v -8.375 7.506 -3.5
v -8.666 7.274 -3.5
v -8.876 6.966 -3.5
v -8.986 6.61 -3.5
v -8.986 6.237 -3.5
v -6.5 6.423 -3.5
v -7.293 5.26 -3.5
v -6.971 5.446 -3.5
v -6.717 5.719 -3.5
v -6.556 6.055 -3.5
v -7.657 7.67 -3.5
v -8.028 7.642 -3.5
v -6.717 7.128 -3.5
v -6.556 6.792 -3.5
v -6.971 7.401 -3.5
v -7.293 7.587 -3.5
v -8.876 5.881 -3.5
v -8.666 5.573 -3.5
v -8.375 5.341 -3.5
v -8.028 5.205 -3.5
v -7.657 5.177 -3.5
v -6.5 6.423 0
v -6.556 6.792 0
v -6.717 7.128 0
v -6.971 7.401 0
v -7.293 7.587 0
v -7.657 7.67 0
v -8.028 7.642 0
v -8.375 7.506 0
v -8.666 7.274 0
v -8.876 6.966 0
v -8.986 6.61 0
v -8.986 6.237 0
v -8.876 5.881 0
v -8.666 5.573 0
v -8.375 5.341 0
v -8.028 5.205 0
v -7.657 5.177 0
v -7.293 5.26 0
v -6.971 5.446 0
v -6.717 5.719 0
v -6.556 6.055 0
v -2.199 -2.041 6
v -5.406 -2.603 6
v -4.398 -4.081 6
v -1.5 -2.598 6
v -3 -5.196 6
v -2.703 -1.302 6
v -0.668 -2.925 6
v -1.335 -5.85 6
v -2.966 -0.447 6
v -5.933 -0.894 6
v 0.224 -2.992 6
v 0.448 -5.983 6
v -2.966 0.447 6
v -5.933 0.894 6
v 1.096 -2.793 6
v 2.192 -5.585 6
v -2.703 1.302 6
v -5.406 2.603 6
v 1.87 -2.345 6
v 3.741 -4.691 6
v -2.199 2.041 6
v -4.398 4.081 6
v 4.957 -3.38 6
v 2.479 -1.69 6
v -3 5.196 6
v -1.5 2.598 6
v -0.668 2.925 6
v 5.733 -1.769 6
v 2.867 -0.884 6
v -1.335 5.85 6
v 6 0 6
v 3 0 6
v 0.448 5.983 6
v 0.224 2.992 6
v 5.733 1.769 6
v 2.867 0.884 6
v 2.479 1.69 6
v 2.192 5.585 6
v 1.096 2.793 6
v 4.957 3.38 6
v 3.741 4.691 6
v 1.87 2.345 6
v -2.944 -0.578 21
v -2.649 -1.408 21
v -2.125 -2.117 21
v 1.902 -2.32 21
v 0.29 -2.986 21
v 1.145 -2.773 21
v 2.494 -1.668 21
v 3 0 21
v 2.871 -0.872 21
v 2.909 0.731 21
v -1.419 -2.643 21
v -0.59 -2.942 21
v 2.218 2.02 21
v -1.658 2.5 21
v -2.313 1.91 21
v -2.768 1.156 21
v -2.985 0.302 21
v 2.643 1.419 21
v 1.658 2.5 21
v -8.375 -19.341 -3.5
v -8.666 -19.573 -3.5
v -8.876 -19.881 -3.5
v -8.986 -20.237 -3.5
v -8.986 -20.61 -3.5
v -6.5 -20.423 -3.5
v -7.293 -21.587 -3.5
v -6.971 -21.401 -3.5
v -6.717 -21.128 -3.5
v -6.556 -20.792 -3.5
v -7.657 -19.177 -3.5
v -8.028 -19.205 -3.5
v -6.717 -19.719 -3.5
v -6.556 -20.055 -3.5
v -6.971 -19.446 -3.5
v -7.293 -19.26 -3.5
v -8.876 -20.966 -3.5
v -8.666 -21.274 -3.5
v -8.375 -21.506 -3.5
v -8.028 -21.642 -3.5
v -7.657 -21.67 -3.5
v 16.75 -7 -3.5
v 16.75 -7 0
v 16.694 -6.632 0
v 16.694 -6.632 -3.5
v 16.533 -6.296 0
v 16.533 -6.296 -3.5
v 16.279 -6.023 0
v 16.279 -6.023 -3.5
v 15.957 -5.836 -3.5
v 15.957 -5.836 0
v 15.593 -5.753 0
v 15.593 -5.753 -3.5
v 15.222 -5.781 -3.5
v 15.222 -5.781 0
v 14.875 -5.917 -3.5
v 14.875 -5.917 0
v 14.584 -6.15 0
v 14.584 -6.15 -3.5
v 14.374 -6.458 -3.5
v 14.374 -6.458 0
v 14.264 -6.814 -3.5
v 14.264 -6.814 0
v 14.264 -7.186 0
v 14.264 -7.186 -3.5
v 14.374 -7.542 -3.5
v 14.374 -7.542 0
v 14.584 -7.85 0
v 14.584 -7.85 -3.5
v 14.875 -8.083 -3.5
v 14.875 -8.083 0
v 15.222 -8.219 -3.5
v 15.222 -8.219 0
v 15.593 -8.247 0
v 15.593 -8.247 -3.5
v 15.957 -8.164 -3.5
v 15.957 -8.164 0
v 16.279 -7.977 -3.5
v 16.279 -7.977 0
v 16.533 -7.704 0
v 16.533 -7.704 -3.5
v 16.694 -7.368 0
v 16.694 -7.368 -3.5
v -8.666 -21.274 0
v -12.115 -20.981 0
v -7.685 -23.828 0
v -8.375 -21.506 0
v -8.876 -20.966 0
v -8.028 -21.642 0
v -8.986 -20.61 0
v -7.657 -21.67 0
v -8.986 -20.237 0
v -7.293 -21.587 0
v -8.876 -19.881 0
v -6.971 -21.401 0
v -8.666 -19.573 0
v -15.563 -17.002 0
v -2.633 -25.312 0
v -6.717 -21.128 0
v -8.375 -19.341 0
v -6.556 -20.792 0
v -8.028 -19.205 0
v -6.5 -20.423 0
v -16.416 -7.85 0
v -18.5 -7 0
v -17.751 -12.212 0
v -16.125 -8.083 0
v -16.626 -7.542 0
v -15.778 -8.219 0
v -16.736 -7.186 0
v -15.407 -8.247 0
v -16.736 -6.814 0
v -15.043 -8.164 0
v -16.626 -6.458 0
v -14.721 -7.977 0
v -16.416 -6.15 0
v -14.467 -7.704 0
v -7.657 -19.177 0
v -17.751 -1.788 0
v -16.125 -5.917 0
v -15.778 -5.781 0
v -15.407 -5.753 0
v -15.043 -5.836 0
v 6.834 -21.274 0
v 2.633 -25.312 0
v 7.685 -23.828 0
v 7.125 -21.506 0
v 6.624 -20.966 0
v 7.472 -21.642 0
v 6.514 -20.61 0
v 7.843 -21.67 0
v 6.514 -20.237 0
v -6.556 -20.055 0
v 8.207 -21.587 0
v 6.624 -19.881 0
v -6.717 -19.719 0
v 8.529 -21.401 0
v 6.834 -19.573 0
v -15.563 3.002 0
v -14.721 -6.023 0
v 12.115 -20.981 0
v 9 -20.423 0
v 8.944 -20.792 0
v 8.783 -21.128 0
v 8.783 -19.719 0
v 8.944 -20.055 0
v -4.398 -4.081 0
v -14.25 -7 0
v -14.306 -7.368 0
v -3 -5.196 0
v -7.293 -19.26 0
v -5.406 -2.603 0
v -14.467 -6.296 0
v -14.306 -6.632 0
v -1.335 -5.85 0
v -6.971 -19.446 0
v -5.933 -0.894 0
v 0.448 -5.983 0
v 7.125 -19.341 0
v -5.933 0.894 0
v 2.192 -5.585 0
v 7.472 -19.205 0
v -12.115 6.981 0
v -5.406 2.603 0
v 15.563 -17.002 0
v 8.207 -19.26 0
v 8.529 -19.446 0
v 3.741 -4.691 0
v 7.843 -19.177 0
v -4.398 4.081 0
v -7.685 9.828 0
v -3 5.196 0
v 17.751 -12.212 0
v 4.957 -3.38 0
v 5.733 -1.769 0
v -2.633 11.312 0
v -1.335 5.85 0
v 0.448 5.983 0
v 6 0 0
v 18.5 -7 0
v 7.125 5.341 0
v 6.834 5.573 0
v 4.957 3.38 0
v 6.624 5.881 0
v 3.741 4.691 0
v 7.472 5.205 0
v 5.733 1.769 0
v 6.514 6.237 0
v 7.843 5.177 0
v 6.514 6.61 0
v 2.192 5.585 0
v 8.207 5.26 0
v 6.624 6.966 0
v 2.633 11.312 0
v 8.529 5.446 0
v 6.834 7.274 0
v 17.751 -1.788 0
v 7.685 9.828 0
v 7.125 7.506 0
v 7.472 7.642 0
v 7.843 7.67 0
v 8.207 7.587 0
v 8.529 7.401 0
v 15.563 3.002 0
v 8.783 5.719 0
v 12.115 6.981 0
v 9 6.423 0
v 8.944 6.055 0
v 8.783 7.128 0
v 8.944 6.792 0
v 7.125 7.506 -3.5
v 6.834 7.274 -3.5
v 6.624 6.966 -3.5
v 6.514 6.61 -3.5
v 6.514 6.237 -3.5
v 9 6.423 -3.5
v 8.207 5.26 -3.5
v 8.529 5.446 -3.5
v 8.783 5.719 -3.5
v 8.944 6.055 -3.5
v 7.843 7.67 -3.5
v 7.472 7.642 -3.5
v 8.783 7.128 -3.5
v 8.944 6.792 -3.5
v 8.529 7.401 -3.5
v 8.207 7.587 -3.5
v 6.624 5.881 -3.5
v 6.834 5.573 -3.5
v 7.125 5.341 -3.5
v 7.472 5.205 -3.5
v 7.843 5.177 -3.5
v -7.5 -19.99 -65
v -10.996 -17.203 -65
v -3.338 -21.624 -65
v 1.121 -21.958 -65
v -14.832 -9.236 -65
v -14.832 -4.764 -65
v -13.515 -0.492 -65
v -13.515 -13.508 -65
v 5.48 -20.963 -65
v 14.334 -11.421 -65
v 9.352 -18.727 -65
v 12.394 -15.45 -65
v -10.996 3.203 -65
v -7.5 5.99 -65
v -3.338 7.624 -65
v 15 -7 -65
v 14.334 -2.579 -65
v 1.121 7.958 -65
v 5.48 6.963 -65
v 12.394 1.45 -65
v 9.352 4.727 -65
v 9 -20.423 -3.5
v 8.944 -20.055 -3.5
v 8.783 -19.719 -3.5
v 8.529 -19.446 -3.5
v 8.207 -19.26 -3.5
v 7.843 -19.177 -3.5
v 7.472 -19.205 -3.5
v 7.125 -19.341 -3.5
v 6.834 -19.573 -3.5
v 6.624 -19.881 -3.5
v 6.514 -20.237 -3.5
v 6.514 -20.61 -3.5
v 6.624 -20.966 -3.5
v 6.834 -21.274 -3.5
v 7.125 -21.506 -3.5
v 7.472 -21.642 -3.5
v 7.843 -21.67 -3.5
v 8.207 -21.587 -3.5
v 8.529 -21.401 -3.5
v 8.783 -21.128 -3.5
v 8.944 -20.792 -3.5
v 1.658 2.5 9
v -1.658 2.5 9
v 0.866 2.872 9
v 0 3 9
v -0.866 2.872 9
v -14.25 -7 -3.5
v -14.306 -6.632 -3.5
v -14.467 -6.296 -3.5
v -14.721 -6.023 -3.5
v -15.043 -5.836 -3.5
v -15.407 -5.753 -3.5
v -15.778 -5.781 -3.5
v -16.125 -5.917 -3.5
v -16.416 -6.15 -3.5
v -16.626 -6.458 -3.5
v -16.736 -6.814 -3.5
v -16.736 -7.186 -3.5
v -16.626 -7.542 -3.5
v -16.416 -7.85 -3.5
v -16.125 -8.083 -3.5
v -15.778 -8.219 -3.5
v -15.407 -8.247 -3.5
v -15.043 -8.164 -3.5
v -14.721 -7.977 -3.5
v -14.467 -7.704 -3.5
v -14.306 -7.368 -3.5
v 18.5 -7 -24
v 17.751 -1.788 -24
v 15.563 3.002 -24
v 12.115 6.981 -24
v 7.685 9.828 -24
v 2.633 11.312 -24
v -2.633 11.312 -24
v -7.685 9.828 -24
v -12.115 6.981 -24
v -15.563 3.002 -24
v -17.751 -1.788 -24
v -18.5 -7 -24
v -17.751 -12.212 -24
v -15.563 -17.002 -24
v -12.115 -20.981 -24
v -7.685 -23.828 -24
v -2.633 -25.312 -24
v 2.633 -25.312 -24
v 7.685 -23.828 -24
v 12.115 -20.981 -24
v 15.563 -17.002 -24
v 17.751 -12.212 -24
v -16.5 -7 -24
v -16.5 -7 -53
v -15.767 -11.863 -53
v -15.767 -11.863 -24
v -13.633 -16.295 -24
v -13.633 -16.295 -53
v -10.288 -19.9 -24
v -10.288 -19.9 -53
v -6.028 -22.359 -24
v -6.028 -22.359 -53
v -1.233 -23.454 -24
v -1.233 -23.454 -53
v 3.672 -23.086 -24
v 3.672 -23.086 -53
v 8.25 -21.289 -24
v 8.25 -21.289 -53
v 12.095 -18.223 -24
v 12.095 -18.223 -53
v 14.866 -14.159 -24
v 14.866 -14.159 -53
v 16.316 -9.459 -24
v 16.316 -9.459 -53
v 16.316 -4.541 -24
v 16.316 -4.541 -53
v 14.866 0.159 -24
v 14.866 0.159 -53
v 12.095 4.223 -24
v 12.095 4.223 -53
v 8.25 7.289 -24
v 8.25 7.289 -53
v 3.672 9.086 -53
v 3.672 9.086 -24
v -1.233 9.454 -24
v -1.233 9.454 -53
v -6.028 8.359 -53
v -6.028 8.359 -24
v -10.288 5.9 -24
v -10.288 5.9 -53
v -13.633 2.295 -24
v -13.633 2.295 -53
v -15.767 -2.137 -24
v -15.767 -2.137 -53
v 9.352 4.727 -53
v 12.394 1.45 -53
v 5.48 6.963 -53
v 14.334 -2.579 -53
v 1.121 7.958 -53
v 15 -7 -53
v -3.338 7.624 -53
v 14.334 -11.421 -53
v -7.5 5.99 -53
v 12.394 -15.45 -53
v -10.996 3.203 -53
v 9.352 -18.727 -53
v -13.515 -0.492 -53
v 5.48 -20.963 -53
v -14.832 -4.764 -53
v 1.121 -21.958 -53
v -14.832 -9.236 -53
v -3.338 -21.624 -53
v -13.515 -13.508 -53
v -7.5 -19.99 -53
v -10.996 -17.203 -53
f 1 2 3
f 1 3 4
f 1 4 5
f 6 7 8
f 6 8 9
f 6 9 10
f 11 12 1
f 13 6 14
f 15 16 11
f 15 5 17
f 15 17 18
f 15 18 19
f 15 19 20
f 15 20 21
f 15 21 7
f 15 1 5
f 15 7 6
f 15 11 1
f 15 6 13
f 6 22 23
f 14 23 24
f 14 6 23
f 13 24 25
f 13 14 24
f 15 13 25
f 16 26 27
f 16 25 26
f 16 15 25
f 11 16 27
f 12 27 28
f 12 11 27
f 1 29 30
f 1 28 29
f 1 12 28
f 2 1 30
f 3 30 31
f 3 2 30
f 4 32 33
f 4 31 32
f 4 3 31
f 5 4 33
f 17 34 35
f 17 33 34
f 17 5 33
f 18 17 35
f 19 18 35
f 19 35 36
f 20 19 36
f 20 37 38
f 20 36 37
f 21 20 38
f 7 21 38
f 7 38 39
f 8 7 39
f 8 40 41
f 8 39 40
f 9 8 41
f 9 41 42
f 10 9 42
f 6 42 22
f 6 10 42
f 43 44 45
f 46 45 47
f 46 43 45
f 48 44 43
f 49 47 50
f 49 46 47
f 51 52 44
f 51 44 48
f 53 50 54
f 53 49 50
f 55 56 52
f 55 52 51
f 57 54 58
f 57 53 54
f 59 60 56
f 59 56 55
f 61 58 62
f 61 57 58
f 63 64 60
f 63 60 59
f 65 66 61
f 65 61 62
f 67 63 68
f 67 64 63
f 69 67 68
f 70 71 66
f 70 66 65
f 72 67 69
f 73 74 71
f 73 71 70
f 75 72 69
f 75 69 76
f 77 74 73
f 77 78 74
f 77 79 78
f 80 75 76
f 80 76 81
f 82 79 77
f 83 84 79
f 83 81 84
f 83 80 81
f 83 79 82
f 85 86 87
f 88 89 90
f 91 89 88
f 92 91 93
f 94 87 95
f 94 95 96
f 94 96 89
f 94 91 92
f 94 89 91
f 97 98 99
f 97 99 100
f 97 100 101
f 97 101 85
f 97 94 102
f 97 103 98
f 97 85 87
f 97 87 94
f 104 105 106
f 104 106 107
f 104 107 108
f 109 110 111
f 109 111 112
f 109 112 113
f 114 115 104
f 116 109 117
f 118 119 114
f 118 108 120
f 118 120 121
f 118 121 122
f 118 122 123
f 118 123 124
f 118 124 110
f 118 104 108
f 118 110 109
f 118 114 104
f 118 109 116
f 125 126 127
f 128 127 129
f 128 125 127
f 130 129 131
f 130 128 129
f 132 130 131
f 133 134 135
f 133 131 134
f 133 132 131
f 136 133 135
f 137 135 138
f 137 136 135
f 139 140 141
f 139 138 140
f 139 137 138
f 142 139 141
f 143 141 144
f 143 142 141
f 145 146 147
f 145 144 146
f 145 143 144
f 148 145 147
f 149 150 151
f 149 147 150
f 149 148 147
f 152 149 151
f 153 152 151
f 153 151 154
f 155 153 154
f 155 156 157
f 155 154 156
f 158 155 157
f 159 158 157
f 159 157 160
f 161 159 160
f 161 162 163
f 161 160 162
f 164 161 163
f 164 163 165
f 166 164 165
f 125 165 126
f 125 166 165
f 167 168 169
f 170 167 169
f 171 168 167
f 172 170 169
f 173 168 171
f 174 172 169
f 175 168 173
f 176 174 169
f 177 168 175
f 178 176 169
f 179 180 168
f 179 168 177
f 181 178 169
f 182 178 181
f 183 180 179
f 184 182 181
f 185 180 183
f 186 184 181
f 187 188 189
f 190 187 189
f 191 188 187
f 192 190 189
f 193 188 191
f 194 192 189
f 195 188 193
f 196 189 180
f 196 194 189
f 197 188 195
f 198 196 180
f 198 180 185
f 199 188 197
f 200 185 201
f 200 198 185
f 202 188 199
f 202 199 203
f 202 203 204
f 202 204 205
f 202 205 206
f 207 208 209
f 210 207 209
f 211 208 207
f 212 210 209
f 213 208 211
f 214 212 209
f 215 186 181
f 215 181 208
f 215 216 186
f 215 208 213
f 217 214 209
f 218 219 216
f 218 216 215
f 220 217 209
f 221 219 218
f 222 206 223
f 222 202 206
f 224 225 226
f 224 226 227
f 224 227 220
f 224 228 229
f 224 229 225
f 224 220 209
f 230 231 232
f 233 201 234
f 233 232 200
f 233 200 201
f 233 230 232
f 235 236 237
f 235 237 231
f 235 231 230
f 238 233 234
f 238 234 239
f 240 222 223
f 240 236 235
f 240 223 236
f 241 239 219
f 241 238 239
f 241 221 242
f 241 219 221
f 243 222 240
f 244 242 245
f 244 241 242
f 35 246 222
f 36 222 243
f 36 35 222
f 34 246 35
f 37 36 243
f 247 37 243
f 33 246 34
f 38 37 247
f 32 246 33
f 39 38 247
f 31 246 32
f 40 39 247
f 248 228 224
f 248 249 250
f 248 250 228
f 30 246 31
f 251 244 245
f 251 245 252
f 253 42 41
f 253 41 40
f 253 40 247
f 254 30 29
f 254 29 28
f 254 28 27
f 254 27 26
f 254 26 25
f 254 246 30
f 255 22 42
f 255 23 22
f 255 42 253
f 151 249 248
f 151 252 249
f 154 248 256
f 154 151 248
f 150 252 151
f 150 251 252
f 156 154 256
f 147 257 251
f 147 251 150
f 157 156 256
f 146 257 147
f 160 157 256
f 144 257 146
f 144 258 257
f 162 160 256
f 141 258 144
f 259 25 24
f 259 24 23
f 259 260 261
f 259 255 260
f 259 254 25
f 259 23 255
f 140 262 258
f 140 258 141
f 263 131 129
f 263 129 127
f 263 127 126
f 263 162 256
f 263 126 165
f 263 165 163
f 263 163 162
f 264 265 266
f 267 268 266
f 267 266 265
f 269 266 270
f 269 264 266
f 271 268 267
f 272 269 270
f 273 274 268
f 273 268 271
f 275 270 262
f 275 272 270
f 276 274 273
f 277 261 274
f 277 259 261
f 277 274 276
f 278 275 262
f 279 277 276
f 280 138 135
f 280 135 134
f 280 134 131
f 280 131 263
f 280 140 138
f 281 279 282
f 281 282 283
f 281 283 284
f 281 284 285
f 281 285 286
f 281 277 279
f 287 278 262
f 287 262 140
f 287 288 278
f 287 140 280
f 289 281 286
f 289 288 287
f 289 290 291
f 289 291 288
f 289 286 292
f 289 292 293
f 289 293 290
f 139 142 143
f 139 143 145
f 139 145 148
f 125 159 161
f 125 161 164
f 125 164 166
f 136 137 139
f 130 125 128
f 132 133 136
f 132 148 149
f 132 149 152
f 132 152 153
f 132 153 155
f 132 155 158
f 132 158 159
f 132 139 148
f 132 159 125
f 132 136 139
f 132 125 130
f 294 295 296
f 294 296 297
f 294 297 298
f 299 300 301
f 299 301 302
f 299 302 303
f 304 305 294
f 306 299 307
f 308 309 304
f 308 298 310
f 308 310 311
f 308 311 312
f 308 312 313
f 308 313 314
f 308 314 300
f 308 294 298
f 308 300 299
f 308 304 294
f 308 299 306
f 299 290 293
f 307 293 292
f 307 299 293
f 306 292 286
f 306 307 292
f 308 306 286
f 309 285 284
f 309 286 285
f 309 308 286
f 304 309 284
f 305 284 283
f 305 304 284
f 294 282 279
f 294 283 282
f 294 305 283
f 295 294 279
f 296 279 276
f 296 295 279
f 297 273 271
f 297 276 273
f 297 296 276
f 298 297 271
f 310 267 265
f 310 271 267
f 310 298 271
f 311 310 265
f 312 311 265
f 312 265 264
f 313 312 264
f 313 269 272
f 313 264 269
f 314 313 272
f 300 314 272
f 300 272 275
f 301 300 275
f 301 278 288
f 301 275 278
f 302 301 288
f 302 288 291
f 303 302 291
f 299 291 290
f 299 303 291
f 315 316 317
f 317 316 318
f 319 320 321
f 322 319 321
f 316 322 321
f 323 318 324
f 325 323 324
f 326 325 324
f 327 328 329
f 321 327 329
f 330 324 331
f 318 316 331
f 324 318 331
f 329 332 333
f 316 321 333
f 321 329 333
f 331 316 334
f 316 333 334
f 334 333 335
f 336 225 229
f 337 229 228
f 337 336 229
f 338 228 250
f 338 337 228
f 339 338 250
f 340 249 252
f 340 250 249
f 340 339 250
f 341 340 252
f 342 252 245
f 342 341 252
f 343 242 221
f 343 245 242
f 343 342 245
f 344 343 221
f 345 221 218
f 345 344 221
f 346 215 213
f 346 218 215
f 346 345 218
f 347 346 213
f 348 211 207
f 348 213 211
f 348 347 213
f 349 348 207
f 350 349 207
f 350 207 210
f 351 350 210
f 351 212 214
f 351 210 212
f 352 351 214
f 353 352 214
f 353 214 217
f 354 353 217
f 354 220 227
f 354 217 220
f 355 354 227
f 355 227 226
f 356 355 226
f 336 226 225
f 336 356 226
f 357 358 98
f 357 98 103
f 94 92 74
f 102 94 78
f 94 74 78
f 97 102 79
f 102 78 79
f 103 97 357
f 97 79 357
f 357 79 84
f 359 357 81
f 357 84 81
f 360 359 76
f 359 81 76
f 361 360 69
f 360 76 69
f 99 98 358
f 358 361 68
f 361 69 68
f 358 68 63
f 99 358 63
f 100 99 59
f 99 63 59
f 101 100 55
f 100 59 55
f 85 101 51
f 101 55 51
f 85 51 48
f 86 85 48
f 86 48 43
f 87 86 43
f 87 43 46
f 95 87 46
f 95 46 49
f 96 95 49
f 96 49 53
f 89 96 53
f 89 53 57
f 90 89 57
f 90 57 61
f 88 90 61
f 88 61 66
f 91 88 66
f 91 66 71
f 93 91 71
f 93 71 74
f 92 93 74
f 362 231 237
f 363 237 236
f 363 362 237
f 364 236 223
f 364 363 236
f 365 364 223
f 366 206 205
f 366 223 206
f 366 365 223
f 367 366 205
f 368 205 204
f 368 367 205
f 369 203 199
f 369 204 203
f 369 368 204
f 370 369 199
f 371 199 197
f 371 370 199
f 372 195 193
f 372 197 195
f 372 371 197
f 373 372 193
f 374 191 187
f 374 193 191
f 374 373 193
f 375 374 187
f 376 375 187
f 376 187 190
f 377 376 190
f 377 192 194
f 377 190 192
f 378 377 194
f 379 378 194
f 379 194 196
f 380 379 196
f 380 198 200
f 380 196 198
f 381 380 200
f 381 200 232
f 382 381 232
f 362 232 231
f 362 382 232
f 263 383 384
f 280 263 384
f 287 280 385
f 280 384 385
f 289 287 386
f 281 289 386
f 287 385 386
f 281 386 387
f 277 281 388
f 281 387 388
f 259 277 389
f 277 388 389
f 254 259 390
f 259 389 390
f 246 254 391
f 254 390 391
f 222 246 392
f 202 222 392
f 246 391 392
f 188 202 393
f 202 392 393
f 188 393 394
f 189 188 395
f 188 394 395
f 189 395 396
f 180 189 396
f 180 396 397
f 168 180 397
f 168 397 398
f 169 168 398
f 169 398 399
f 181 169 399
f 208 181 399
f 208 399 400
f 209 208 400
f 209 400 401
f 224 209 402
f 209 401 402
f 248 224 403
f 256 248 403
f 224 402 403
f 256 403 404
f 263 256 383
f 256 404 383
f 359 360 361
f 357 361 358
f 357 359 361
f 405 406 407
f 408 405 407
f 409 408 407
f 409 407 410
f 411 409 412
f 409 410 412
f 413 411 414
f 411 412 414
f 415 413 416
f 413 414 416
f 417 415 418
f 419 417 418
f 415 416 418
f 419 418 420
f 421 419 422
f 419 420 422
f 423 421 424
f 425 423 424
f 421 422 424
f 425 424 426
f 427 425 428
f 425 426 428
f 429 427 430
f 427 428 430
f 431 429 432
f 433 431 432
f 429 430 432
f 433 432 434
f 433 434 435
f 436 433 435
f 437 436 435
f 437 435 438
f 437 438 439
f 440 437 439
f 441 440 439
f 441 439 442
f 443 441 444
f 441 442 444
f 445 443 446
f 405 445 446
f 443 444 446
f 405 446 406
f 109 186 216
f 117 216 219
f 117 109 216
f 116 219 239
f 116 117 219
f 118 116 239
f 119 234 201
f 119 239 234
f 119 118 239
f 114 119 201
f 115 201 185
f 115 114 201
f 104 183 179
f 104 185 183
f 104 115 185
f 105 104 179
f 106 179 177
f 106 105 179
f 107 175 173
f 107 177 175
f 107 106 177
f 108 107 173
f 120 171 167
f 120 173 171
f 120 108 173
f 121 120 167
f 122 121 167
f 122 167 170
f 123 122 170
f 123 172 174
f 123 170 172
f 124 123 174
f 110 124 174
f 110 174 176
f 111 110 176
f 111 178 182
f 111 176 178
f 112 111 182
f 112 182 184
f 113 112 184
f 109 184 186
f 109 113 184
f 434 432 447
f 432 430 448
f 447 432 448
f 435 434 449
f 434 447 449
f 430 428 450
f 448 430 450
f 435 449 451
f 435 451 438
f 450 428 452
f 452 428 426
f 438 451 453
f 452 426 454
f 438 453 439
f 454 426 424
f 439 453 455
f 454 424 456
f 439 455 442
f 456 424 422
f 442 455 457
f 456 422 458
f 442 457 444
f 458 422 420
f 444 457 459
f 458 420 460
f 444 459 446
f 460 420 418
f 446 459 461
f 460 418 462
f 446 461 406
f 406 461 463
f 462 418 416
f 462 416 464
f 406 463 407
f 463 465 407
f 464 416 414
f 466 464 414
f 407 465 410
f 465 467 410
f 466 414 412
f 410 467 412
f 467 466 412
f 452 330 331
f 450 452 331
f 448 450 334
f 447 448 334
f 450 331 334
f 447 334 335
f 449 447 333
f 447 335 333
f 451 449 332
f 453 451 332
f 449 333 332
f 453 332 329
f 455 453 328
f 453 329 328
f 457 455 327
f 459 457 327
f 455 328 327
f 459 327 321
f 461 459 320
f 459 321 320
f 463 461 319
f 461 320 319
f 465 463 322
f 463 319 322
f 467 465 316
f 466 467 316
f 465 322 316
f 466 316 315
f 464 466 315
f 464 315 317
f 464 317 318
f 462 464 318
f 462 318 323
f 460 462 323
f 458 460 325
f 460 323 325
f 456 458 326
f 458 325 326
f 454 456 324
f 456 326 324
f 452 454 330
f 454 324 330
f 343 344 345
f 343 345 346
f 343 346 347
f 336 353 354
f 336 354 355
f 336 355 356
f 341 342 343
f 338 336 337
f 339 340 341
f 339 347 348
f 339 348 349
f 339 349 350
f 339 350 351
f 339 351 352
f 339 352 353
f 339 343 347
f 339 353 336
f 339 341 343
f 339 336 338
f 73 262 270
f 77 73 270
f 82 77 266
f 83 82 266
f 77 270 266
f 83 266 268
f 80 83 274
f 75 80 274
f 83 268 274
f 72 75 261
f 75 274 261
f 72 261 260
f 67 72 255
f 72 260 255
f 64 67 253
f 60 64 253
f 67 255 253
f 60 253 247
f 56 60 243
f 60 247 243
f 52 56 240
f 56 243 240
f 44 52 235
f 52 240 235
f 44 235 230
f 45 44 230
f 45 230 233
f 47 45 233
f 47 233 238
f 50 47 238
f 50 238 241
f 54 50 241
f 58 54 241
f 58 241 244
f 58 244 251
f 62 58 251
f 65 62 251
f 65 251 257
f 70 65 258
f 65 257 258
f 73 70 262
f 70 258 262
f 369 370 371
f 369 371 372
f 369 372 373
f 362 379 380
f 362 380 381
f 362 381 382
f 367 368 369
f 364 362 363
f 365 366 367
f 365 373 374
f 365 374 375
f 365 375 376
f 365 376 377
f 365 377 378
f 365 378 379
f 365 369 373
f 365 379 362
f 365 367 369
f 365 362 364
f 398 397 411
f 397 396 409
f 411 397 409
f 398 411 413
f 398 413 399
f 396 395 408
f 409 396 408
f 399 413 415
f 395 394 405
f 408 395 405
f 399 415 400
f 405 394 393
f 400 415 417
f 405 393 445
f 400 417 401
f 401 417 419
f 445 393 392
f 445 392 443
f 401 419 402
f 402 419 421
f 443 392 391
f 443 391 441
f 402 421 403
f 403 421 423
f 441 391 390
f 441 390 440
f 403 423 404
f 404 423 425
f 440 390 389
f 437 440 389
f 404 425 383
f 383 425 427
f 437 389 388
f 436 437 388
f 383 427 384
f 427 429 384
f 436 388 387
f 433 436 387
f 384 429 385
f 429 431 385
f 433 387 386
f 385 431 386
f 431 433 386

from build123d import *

# Parameters (mm, degrees)
GEARBOX_START          = -24
PROFILE_1_R            = 18.5
GEARBOX_DEPTH          = 24
THREAD_PILOTS_START    = -3.5
PROFILE_2_R            = 1.25
THREAD_PILOTS_DEPTH    = 3.51
ARMATURE_START         = -53
PROFILE_3_R            = 16.5
ARMATURE_DEPTH         = 29
ENCODER_ENVELOPE_START = -65
PROFILE_4_R            = 15
ENCODER_ENVELOPE_DEPTH = 12
PROFILE_5_R            = 6
NOSE_DEPTH             = 6
OUTPUT_START           = 6
PROFILE_6_R            = 3
OUTPUT_DEPTH           = 15
D_FLAT_START           = 9
PROFILE_7_W            = 8
PROFILE_7_H            = 1.5
D_FLAT_DEPTH           = 12.01


with BuildPart() as part:
    # Profile_1 → Gearbox (new body)
    with BuildSketch(Plane.XY.offset(GEARBOX_START)):
        with Locations((0, -7)):
            Circle(PROFILE_1_R)
    extrude(amount=GEARBOX_DEPTH)

    # Profile_2 → Thread_pilots (cut)
    with BuildSketch(Plane.XY.offset(THREAD_PILOTS_START)):
        with Locations((15.5, -7)):
            Circle(PROFILE_2_R)
        with Locations((7.75, 6.423393759)):
            Circle(PROFILE_2_R)
        with Locations((-7.75, 6.423393759)):
            Circle(PROFILE_2_R)
        with Locations((-15.5, -7)):
            Circle(PROFILE_2_R)
        with Locations((-7.75, -20.423393759)):
            Circle(PROFILE_2_R)
        with Locations((7.75, -20.423393759)):
            Circle(PROFILE_2_R)
    extrude(amount=THREAD_PILOTS_DEPTH, mode=Mode.SUBTRACT)

    # Profile_3 → Armature (add)
    with BuildSketch(Plane.XY.offset(ARMATURE_START)):
        with Locations(Location((0, -7, 0), (0, 0, 180))):
            Circle(PROFILE_3_R)
    extrude(amount=ARMATURE_DEPTH)

    # Profile_4 → Encoder_envelope (add)
    with BuildSketch(Plane.XY.offset(ENCODER_ENVELOPE_START)):
        with Locations((0, -7)):
            Circle(PROFILE_4_R)
    extrude(amount=ENCODER_ENVELOPE_DEPTH)

    # Profile_5 → Nose (add)
    with BuildSketch(Plane.XY):
        Circle(PROFILE_5_R)
    extrude(amount=NOSE_DEPTH)

    # Profile_6 → Output (add)
    with BuildSketch(Plane.XY.offset(OUTPUT_START)):
        Circle(PROFILE_6_R)
    extrude(amount=OUTPUT_DEPTH)

    # Profile_7 → D_flat (cut)
    with BuildSketch(Plane.XY.offset(D_FLAT_START)):
        with Locations((0, 3.25)):
            Rectangle(PROFILE_7_W, PROFILE_7_H)
    extrude(amount=D_FLAT_DEPTH, mode=Mode.SUBTRACT)


solid = part.part
